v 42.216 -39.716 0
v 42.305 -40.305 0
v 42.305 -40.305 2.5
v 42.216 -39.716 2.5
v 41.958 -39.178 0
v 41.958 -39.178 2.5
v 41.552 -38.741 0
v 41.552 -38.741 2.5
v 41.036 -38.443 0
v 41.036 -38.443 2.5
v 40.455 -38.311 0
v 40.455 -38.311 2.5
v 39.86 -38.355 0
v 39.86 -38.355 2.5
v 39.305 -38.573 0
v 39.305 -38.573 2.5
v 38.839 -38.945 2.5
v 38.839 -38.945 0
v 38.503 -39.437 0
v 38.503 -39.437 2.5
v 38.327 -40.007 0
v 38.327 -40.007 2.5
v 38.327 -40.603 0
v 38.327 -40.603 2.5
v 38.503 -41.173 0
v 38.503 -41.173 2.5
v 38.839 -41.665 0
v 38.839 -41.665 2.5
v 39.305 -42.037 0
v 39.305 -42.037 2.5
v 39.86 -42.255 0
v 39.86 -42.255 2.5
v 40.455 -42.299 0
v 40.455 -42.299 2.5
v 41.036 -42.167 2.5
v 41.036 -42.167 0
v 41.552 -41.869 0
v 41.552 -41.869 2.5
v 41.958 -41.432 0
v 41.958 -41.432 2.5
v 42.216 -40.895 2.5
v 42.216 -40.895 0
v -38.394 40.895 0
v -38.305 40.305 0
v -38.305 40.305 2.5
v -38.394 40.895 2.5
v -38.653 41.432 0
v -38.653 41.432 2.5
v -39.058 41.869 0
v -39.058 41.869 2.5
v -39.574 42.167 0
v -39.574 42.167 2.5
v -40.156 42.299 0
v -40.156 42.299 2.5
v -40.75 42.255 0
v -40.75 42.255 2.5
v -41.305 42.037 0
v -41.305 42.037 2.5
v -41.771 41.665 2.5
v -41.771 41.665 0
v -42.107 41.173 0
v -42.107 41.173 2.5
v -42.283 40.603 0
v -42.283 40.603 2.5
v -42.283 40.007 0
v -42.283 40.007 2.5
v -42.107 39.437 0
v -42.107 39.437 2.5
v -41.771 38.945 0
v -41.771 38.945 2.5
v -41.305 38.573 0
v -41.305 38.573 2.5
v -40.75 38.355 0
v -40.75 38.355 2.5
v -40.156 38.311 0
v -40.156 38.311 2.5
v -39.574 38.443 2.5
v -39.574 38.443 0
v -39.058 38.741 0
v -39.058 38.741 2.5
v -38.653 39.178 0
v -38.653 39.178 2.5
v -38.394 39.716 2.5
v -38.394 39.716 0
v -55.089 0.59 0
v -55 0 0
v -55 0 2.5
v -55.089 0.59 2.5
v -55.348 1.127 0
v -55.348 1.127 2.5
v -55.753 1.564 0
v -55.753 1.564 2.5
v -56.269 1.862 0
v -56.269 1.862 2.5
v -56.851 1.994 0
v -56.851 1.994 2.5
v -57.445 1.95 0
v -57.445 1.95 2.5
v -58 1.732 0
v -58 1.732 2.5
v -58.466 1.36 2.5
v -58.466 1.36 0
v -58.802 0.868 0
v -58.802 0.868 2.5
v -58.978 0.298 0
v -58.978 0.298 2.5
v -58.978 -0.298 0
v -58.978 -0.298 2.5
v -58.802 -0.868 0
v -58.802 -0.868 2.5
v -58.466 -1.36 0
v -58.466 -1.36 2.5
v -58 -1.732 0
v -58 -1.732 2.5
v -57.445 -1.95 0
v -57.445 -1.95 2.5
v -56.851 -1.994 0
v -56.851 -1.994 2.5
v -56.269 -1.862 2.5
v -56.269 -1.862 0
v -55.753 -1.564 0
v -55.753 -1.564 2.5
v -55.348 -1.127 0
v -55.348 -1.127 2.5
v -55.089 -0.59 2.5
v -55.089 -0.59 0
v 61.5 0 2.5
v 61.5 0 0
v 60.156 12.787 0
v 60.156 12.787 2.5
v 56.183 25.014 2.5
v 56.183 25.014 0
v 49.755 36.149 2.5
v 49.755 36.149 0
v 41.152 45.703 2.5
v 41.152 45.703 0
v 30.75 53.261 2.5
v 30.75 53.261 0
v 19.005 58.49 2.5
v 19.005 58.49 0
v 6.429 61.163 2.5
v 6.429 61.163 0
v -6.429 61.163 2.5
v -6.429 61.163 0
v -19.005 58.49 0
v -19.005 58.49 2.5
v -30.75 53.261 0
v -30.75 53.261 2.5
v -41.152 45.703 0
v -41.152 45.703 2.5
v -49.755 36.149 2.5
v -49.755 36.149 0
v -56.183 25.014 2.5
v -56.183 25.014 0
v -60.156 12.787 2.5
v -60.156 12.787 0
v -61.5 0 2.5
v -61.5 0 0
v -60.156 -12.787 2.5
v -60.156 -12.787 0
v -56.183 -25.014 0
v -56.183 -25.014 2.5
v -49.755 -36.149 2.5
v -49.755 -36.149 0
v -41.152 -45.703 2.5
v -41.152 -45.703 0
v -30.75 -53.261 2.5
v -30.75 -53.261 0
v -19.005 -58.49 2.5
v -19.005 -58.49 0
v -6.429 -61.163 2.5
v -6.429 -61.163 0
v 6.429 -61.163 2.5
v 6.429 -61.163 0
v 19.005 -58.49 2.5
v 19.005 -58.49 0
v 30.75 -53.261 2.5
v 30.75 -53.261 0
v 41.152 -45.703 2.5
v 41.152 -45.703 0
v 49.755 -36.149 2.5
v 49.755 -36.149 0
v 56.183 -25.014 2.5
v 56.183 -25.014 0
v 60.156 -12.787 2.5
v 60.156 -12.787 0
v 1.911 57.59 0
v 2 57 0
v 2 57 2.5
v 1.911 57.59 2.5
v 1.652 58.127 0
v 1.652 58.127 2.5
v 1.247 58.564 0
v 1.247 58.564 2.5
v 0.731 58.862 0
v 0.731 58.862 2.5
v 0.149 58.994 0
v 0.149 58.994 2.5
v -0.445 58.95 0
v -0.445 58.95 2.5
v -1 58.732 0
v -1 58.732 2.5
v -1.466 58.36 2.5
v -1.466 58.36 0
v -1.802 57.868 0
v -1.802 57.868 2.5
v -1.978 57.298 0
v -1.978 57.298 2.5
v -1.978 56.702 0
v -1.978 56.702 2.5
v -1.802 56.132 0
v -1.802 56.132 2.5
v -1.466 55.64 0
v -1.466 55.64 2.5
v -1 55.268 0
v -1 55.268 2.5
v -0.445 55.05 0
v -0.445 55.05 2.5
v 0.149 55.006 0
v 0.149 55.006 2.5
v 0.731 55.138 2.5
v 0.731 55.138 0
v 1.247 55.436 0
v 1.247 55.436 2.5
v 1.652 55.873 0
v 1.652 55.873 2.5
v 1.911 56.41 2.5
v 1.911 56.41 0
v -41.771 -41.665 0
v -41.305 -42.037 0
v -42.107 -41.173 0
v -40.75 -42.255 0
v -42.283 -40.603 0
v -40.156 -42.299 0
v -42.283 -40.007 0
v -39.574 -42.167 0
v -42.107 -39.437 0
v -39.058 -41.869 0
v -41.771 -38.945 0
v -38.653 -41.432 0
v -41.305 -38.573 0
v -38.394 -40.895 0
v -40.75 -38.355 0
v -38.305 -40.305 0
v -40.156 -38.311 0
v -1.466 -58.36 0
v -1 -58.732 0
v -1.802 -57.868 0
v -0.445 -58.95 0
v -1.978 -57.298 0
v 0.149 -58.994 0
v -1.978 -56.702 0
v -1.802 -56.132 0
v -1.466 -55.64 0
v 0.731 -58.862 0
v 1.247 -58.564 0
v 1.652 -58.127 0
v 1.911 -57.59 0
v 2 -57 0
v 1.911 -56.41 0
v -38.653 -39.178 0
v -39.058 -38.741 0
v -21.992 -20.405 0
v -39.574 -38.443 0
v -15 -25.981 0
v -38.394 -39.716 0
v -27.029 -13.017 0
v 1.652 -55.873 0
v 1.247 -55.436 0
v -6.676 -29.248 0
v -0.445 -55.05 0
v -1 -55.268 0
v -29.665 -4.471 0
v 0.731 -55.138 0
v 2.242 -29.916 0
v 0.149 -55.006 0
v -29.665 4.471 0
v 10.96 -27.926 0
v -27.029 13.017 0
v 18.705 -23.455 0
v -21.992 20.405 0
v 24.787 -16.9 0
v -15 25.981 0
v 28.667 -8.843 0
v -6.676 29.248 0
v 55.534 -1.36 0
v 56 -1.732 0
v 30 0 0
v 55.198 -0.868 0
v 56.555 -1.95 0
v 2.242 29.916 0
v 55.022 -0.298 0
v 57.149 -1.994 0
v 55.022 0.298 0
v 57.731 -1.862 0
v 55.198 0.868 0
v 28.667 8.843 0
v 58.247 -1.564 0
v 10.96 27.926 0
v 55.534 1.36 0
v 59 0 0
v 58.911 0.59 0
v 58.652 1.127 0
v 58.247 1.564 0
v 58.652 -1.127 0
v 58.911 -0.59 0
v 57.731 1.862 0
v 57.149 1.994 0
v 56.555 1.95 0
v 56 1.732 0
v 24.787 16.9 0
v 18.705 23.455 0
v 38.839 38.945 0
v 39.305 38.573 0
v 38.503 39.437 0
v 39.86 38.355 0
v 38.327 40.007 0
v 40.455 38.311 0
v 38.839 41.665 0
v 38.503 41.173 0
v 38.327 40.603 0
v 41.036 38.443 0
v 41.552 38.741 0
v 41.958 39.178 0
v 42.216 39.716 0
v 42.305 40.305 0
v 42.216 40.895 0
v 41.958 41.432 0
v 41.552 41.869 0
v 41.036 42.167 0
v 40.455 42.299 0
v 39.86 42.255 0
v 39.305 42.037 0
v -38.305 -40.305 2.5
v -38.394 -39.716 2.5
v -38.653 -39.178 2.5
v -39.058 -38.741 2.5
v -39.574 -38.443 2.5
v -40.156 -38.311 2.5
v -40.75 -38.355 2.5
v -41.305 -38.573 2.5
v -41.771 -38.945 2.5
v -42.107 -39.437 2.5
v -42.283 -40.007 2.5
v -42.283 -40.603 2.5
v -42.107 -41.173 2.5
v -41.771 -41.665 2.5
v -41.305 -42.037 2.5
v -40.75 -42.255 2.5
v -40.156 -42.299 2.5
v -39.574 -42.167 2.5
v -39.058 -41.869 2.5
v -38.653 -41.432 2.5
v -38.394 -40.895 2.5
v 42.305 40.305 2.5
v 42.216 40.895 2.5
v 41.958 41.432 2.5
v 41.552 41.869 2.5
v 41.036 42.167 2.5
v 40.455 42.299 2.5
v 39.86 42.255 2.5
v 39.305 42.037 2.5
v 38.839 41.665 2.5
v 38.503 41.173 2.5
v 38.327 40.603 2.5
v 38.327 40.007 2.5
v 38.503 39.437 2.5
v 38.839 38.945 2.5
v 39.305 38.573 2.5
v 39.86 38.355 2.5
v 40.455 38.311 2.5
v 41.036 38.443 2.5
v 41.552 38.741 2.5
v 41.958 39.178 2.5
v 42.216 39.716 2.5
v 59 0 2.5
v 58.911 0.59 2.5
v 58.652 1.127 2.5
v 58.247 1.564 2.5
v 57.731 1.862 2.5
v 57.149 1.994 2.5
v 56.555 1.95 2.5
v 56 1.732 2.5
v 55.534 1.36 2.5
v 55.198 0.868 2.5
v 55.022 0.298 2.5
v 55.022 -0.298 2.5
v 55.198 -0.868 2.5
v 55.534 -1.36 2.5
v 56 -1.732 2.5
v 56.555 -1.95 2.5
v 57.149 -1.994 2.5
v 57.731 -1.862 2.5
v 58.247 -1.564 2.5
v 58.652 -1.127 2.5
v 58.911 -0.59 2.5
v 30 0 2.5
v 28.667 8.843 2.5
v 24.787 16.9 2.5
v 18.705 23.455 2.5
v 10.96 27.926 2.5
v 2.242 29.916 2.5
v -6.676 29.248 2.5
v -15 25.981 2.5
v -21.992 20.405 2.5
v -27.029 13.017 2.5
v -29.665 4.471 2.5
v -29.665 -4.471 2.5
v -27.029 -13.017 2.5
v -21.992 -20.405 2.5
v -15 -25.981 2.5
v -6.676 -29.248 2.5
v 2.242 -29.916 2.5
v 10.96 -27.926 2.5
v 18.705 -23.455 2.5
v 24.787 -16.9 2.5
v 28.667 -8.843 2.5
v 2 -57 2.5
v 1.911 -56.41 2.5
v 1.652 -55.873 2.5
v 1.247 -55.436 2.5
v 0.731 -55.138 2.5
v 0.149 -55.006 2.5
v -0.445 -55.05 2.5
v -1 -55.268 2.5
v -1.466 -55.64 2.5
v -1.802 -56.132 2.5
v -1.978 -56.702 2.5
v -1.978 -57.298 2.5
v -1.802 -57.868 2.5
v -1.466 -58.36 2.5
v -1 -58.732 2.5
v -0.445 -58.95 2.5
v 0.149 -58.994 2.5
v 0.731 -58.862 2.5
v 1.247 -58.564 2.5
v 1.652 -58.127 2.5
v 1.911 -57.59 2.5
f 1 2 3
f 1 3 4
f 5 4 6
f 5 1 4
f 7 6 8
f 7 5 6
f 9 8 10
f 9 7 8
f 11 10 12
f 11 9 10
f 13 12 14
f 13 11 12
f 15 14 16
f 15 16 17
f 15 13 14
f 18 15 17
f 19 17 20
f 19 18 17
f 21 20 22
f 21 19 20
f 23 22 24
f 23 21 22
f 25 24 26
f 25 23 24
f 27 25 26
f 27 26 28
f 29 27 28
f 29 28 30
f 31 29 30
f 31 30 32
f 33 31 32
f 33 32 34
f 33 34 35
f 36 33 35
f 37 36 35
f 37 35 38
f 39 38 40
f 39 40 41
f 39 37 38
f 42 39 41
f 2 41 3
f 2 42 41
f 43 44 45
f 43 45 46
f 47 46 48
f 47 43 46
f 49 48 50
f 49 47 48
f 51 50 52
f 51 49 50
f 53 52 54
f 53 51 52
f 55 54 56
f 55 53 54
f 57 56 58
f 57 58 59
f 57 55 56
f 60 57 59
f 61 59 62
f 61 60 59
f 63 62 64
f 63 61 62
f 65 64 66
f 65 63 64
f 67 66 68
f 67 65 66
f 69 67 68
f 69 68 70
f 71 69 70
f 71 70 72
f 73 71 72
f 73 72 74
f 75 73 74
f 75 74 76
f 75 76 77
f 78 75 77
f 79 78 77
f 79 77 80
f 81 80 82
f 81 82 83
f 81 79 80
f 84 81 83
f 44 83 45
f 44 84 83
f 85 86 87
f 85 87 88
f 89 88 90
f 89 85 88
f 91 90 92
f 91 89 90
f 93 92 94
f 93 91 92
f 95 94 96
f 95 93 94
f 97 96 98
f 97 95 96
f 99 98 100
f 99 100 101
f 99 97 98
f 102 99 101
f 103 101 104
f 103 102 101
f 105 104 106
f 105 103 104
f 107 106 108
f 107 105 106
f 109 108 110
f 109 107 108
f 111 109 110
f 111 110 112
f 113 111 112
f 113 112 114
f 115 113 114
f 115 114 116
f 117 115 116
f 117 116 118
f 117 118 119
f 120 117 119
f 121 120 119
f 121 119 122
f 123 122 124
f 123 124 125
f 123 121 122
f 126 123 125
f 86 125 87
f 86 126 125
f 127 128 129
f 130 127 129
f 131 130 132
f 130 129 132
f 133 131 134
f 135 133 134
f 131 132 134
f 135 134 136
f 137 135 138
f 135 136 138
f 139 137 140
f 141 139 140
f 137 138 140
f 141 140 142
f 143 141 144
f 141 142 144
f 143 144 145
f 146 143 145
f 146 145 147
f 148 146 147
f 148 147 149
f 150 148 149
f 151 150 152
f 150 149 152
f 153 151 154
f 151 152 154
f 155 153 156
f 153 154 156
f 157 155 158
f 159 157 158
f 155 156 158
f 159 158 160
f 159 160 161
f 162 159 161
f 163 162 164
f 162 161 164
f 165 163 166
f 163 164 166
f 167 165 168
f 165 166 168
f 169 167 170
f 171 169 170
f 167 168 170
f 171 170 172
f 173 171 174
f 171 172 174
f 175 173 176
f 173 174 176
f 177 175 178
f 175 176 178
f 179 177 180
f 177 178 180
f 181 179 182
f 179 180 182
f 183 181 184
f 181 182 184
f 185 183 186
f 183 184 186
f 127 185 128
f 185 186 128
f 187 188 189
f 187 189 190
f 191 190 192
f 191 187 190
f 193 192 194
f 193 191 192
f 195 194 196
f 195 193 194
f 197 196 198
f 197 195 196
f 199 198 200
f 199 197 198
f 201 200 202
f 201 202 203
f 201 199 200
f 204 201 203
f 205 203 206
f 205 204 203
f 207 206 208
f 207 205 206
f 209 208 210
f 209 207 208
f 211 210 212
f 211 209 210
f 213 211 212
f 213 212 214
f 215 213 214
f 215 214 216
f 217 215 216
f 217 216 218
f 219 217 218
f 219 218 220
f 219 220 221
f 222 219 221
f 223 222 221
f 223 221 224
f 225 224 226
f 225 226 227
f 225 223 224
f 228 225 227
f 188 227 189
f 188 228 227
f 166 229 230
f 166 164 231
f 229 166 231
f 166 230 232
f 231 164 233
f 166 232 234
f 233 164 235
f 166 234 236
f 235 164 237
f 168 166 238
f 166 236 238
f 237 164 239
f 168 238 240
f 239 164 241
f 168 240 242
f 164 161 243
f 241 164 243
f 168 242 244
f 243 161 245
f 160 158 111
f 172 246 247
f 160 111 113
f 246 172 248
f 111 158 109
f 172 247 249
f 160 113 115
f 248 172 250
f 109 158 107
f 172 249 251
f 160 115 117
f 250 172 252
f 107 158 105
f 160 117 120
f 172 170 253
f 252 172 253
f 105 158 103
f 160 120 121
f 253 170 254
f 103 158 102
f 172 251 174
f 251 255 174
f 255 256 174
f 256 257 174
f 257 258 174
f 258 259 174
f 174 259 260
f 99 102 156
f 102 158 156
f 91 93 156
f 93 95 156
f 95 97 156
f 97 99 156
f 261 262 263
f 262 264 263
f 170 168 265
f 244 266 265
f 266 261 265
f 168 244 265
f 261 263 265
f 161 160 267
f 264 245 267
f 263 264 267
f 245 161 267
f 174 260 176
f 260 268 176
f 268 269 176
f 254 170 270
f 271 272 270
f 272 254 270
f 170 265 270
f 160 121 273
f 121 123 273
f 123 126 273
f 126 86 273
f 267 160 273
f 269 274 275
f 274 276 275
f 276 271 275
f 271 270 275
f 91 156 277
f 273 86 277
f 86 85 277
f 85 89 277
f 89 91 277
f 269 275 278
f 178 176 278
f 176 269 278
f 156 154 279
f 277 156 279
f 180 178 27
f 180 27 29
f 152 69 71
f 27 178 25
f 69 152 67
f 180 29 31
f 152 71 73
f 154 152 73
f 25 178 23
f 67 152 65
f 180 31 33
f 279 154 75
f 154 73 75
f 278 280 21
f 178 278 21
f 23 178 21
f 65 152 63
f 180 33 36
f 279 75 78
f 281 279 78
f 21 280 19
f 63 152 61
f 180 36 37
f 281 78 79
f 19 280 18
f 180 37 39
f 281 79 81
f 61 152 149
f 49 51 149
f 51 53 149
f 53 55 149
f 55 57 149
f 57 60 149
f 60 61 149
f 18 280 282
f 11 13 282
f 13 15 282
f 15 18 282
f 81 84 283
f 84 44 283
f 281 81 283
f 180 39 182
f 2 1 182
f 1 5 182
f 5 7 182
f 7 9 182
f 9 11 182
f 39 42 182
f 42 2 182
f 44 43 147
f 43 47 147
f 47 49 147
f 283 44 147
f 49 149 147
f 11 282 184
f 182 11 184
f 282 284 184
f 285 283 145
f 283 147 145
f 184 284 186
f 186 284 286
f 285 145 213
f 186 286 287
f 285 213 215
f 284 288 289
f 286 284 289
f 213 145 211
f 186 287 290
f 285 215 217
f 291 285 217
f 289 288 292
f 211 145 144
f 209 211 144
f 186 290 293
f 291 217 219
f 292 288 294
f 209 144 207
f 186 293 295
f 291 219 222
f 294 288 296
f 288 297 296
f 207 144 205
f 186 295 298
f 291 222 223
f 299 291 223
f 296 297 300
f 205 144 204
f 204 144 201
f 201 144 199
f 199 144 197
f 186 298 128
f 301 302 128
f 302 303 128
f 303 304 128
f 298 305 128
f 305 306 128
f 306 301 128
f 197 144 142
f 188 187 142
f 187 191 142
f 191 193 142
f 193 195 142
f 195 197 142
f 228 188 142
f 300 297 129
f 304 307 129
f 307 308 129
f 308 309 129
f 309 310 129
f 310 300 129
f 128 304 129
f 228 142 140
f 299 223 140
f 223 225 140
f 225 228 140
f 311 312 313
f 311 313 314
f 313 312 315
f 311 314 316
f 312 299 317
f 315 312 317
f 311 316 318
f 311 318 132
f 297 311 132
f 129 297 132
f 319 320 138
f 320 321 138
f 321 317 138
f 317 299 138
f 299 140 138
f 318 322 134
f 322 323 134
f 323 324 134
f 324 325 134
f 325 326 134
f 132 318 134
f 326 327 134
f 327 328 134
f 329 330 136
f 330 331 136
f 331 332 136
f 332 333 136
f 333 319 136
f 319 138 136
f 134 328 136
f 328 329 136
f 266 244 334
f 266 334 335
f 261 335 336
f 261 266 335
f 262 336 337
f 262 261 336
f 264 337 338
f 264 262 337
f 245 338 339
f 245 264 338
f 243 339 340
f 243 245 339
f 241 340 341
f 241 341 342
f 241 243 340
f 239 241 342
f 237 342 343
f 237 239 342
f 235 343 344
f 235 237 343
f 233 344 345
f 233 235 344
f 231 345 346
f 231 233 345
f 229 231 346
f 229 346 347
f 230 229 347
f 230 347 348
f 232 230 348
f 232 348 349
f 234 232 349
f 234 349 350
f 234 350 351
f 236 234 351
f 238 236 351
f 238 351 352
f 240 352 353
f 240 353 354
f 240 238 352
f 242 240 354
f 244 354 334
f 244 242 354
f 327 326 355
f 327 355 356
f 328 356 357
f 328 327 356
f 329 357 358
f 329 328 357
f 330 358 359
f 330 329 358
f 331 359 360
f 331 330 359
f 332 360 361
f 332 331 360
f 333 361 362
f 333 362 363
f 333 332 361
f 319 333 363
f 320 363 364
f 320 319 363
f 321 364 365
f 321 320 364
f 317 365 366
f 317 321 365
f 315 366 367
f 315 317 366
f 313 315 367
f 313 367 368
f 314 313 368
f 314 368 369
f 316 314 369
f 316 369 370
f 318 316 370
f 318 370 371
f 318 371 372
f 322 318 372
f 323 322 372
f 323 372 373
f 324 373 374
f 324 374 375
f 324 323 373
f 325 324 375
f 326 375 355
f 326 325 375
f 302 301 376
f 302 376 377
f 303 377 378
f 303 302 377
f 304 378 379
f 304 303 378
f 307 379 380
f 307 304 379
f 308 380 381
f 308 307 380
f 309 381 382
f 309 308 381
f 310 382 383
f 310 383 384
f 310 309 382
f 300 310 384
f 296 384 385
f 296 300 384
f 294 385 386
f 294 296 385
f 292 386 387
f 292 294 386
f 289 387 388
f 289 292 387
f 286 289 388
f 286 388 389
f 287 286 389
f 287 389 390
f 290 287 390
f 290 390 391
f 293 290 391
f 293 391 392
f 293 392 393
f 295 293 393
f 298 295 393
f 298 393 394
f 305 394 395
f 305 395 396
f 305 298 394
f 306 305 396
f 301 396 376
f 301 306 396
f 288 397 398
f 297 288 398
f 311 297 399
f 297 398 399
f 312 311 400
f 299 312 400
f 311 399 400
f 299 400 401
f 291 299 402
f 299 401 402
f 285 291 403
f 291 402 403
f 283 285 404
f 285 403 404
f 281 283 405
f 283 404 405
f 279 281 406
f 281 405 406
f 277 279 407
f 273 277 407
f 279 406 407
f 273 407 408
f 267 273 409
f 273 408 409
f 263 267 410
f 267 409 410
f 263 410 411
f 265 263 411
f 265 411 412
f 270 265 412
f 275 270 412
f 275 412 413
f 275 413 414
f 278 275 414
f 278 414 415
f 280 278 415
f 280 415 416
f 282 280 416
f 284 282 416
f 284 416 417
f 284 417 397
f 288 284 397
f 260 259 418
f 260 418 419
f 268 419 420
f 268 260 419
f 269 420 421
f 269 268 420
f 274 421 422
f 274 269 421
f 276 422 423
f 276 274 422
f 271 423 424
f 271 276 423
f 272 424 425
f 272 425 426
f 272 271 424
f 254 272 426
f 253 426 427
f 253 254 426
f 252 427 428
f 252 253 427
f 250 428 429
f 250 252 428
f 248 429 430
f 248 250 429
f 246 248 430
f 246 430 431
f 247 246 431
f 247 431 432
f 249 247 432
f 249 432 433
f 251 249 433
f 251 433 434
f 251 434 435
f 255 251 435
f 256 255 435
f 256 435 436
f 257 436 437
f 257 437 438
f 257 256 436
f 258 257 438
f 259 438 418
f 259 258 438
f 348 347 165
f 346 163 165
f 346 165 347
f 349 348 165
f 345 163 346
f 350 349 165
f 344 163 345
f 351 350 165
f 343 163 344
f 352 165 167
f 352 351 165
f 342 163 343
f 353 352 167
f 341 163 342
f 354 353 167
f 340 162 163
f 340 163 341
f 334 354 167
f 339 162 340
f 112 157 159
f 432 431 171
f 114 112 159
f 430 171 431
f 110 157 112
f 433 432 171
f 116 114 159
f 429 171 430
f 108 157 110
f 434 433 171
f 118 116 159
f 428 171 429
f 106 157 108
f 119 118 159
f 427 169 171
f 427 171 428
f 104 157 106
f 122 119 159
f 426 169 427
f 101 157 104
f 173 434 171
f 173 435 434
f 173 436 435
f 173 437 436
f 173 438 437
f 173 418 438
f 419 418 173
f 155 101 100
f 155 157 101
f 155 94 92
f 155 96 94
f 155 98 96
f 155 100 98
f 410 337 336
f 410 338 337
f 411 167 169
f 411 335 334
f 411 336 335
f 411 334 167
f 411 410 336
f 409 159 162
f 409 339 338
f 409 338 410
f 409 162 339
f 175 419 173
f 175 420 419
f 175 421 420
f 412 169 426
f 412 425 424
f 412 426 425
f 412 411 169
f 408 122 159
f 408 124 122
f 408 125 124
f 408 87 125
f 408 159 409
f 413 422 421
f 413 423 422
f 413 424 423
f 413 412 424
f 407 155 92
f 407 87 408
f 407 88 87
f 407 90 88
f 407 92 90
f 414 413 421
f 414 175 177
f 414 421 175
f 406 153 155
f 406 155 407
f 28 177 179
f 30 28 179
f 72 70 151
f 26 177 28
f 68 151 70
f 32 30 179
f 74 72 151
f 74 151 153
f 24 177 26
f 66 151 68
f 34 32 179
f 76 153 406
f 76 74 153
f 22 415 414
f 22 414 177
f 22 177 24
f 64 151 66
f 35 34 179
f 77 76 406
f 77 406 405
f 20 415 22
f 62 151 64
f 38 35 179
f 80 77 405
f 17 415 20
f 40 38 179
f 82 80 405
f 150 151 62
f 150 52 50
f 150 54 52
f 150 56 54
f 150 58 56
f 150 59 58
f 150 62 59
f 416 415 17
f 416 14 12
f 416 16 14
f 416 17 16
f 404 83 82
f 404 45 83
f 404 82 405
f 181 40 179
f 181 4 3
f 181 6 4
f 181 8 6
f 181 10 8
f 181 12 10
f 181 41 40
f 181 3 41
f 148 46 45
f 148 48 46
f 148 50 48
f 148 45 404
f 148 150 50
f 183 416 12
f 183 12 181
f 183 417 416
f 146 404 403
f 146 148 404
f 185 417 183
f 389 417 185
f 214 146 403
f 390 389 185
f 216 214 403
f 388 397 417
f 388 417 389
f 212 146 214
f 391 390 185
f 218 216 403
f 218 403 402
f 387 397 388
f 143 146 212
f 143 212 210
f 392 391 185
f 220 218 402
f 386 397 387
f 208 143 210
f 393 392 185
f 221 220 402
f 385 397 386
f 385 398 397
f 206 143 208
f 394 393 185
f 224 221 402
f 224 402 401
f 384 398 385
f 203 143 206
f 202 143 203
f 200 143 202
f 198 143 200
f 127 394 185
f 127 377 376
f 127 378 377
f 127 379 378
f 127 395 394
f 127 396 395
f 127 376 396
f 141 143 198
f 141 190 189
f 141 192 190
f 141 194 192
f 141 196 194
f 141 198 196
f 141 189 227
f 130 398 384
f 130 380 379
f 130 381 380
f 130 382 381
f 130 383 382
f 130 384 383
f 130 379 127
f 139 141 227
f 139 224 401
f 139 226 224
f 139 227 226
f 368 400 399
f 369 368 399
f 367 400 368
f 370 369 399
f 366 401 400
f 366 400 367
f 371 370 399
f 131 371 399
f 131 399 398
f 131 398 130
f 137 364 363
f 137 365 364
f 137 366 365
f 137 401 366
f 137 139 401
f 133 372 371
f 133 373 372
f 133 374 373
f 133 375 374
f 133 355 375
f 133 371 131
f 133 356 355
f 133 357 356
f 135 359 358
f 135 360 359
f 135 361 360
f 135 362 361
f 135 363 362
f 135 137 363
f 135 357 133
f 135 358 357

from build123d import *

# Parameters (mm, degrees)
SKETCH_1_R          = 61.5
SKETCH_1_R_2        = 2
SKETCH_1_R_3        = 2.6
SKETCH_1_R_4        = 15.5
EXTRUDE_1_DEPTH     = 2.5
SKETCH_2_R          = 30
CUT_EXTRUDE_1_DEPTH = 10


with BuildPart() as part:
    # 草图1 → 凸台-拉伸1 (new body)
    with BuildSketch(Plane.XY):
        Circle(SKETCH_1_R)
        with Locations((0, -57)):
            Circle(SKETCH_1_R_2, mode=Mode.SUBTRACT)
        with Locations((-40.305086528, -40.305086528)):
            Circle(SKETCH_1_R_2, mode=Mode.SUBTRACT)
        with Locations((-57, 0)):
            Circle(SKETCH_1_R_2, mode=Mode.SUBTRACT)
        with Locations((-40.305086528, 40.305086528)):
            Circle(SKETCH_1_R_2, mode=Mode.SUBTRACT)
        with Locations((0, -23.75)):
            Circle(SKETCH_1_R_3, mode=Mode.SUBTRACT)
        with Locations((-20.56810334, 11.875)):
            Circle(SKETCH_1_R_3, mode=Mode.SUBTRACT)
        with Locations((20.56810334, 11.875)):
            Circle(SKETCH_1_R_3, mode=Mode.SUBTRACT)
        with Locations((19.485571585, -11.25)):
            Circle(SKETCH_1_R_3, mode=Mode.SUBTRACT)
        with Locations((-19.485571585, -11.25)):
            Circle(SKETCH_1_R_3, mode=Mode.SUBTRACT)
        with Locations((0, 22.5)):
            Circle(SKETCH_1_R_3, mode=Mode.SUBTRACT)
        Circle(SKETCH_1_R_4, mode=Mode.SUBTRACT)
        with Locations((0, 57)):
            Circle(SKETCH_1_R_2, mode=Mode.SUBTRACT)
        with Locations((40.305086528, 40.305086528)):
            Circle(SKETCH_1_R_2, mode=Mode.SUBTRACT)
        with Locations((57, 0)):
            Circle(SKETCH_1_R_2, mode=Mode.SUBTRACT)
        with Locations((40.305086528, -40.305086528)):
            Circle(SKETCH_1_R_2, mode=Mode.SUBTRACT)
    extrude(amount=EXTRUDE_1_DEPTH)

    # 草图2 → 切除-拉伸1 (cut)
    with BuildSketch(Plane.XY.offset(2.5)):
        Circle(SKETCH_2_R)
    extrude(amount=-CUT_EXTRUDE_1_DEPTH, mode=Mode.SUBTRACT)


solid = part.part
